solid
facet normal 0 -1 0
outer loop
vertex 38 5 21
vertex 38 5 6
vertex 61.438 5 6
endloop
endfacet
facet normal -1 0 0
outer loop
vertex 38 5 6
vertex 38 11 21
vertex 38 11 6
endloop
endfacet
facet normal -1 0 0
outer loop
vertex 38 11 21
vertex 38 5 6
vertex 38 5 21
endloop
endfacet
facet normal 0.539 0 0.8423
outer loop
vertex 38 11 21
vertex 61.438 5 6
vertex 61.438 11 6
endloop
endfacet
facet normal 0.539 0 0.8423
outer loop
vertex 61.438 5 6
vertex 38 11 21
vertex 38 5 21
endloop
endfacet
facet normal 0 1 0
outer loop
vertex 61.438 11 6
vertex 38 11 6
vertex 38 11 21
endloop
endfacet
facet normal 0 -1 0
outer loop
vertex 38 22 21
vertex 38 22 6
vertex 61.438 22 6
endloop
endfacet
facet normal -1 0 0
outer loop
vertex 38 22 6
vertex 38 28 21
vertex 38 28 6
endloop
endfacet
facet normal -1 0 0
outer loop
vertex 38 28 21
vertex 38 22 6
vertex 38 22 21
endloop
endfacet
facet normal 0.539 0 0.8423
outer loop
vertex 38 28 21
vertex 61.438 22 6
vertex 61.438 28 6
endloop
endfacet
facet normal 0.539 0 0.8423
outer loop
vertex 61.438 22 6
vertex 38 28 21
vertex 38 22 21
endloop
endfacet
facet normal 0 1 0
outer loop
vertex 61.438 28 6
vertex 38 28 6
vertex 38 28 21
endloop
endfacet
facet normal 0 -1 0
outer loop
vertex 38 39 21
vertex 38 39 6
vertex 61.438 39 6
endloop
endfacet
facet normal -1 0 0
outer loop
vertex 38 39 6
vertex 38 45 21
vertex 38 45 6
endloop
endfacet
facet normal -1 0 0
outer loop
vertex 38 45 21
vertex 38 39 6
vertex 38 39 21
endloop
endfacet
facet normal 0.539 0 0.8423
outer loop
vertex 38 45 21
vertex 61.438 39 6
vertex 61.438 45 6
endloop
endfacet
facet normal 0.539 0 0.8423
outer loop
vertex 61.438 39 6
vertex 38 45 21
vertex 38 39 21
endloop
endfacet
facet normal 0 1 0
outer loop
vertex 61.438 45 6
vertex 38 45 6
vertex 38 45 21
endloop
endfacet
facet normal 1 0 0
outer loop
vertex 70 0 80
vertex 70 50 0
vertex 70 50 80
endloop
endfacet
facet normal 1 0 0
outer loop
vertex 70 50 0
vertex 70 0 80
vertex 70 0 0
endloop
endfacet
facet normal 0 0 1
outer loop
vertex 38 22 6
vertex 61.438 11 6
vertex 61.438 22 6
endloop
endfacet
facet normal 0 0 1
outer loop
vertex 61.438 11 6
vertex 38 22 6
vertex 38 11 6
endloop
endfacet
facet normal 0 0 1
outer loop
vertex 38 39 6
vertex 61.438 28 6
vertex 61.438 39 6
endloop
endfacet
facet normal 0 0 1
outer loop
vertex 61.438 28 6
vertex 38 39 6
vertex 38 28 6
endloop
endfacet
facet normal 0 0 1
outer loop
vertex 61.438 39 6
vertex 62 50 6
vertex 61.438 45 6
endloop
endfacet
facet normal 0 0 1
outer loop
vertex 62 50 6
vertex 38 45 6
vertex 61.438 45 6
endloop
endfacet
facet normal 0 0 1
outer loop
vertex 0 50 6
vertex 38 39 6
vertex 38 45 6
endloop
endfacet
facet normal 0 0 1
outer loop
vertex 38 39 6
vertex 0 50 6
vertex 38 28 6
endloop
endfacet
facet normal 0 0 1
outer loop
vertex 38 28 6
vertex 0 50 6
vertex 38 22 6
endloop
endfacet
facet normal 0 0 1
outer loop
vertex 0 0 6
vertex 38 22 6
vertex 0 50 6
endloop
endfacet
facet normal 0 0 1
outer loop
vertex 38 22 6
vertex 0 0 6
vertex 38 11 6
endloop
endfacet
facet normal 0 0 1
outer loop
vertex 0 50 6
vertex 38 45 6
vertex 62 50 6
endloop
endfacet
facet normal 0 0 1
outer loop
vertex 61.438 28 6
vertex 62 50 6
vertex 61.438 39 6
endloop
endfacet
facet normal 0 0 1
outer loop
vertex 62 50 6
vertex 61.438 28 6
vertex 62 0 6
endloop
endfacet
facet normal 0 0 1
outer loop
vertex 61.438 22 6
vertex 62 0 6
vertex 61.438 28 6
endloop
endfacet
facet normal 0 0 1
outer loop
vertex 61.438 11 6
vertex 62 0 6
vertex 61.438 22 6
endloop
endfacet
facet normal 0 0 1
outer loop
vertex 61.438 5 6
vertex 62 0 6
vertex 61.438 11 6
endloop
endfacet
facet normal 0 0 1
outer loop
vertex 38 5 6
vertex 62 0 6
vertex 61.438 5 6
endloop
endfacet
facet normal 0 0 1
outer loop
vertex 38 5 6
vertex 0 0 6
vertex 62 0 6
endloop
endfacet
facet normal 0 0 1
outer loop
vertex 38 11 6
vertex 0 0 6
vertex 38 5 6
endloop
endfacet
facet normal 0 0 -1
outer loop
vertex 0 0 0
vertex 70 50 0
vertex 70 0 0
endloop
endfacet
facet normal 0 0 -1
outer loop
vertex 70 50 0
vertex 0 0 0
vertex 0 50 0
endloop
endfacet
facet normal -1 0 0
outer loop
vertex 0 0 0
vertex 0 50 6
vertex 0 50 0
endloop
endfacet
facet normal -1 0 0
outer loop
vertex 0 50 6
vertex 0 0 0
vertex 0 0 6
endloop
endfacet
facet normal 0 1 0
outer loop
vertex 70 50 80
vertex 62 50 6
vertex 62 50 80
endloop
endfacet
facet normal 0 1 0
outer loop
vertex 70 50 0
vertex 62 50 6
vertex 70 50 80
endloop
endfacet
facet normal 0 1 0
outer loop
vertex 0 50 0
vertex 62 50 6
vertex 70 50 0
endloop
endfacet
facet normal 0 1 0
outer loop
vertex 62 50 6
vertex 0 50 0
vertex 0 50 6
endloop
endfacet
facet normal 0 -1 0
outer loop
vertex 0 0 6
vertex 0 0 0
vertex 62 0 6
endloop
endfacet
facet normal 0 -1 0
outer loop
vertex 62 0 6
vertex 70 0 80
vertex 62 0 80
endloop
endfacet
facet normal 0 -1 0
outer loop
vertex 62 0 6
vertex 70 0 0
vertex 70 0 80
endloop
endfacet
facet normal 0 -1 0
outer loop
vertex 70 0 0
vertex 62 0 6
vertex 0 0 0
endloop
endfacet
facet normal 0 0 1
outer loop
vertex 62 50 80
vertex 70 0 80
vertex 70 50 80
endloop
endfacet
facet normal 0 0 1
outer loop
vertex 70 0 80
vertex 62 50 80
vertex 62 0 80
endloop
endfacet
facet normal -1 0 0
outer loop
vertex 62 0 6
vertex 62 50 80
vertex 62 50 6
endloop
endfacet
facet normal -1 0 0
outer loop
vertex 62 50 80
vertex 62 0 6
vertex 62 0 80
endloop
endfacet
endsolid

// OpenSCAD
$fn = 32;

// ----------------------------------------------------------------------
// Rib bracket: 3-gusset L bracket
// ----------------------------------------------------------------------

// --- parameters (mm) ---
base_l = 70;              // foot length, X
base_w = 50;              // foot width, Y
base_t = 6;               // foot thickness
plate_t = 8;              // upright plate thickness
plate_h = 80;             // overall height
gus_l = 24;               // gusset leg along the foot
gus_h = 16;               // gusset height
gus_t = 6;                // gusset thickness
gus_edge = 5;             // gusset margin from the foot edge
n_gus = 3;                // gusset count

gus_pitch = (base_w - 2 * gus_edge - gus_t) / (n_gus - 1);  // gusset pitch

union() {
  cube([base_l, base_w, base_t]);
  translate([base_l - plate_t, 0, base_t - 1])
    cube([plate_t, base_w, plate_h - base_t + 1]);
  for (i = [0 : n_gus - 1])
    translate([base_l - plate_t - gus_l, gus_edge + i * gus_pitch, base_t - 1])
      rotate([-90, 0, 0])
        linear_extrude(height = gus_t)
          polygon(points = [[0, 0], [gus_l + 1, 0], [0, -gus_h]]);
}
